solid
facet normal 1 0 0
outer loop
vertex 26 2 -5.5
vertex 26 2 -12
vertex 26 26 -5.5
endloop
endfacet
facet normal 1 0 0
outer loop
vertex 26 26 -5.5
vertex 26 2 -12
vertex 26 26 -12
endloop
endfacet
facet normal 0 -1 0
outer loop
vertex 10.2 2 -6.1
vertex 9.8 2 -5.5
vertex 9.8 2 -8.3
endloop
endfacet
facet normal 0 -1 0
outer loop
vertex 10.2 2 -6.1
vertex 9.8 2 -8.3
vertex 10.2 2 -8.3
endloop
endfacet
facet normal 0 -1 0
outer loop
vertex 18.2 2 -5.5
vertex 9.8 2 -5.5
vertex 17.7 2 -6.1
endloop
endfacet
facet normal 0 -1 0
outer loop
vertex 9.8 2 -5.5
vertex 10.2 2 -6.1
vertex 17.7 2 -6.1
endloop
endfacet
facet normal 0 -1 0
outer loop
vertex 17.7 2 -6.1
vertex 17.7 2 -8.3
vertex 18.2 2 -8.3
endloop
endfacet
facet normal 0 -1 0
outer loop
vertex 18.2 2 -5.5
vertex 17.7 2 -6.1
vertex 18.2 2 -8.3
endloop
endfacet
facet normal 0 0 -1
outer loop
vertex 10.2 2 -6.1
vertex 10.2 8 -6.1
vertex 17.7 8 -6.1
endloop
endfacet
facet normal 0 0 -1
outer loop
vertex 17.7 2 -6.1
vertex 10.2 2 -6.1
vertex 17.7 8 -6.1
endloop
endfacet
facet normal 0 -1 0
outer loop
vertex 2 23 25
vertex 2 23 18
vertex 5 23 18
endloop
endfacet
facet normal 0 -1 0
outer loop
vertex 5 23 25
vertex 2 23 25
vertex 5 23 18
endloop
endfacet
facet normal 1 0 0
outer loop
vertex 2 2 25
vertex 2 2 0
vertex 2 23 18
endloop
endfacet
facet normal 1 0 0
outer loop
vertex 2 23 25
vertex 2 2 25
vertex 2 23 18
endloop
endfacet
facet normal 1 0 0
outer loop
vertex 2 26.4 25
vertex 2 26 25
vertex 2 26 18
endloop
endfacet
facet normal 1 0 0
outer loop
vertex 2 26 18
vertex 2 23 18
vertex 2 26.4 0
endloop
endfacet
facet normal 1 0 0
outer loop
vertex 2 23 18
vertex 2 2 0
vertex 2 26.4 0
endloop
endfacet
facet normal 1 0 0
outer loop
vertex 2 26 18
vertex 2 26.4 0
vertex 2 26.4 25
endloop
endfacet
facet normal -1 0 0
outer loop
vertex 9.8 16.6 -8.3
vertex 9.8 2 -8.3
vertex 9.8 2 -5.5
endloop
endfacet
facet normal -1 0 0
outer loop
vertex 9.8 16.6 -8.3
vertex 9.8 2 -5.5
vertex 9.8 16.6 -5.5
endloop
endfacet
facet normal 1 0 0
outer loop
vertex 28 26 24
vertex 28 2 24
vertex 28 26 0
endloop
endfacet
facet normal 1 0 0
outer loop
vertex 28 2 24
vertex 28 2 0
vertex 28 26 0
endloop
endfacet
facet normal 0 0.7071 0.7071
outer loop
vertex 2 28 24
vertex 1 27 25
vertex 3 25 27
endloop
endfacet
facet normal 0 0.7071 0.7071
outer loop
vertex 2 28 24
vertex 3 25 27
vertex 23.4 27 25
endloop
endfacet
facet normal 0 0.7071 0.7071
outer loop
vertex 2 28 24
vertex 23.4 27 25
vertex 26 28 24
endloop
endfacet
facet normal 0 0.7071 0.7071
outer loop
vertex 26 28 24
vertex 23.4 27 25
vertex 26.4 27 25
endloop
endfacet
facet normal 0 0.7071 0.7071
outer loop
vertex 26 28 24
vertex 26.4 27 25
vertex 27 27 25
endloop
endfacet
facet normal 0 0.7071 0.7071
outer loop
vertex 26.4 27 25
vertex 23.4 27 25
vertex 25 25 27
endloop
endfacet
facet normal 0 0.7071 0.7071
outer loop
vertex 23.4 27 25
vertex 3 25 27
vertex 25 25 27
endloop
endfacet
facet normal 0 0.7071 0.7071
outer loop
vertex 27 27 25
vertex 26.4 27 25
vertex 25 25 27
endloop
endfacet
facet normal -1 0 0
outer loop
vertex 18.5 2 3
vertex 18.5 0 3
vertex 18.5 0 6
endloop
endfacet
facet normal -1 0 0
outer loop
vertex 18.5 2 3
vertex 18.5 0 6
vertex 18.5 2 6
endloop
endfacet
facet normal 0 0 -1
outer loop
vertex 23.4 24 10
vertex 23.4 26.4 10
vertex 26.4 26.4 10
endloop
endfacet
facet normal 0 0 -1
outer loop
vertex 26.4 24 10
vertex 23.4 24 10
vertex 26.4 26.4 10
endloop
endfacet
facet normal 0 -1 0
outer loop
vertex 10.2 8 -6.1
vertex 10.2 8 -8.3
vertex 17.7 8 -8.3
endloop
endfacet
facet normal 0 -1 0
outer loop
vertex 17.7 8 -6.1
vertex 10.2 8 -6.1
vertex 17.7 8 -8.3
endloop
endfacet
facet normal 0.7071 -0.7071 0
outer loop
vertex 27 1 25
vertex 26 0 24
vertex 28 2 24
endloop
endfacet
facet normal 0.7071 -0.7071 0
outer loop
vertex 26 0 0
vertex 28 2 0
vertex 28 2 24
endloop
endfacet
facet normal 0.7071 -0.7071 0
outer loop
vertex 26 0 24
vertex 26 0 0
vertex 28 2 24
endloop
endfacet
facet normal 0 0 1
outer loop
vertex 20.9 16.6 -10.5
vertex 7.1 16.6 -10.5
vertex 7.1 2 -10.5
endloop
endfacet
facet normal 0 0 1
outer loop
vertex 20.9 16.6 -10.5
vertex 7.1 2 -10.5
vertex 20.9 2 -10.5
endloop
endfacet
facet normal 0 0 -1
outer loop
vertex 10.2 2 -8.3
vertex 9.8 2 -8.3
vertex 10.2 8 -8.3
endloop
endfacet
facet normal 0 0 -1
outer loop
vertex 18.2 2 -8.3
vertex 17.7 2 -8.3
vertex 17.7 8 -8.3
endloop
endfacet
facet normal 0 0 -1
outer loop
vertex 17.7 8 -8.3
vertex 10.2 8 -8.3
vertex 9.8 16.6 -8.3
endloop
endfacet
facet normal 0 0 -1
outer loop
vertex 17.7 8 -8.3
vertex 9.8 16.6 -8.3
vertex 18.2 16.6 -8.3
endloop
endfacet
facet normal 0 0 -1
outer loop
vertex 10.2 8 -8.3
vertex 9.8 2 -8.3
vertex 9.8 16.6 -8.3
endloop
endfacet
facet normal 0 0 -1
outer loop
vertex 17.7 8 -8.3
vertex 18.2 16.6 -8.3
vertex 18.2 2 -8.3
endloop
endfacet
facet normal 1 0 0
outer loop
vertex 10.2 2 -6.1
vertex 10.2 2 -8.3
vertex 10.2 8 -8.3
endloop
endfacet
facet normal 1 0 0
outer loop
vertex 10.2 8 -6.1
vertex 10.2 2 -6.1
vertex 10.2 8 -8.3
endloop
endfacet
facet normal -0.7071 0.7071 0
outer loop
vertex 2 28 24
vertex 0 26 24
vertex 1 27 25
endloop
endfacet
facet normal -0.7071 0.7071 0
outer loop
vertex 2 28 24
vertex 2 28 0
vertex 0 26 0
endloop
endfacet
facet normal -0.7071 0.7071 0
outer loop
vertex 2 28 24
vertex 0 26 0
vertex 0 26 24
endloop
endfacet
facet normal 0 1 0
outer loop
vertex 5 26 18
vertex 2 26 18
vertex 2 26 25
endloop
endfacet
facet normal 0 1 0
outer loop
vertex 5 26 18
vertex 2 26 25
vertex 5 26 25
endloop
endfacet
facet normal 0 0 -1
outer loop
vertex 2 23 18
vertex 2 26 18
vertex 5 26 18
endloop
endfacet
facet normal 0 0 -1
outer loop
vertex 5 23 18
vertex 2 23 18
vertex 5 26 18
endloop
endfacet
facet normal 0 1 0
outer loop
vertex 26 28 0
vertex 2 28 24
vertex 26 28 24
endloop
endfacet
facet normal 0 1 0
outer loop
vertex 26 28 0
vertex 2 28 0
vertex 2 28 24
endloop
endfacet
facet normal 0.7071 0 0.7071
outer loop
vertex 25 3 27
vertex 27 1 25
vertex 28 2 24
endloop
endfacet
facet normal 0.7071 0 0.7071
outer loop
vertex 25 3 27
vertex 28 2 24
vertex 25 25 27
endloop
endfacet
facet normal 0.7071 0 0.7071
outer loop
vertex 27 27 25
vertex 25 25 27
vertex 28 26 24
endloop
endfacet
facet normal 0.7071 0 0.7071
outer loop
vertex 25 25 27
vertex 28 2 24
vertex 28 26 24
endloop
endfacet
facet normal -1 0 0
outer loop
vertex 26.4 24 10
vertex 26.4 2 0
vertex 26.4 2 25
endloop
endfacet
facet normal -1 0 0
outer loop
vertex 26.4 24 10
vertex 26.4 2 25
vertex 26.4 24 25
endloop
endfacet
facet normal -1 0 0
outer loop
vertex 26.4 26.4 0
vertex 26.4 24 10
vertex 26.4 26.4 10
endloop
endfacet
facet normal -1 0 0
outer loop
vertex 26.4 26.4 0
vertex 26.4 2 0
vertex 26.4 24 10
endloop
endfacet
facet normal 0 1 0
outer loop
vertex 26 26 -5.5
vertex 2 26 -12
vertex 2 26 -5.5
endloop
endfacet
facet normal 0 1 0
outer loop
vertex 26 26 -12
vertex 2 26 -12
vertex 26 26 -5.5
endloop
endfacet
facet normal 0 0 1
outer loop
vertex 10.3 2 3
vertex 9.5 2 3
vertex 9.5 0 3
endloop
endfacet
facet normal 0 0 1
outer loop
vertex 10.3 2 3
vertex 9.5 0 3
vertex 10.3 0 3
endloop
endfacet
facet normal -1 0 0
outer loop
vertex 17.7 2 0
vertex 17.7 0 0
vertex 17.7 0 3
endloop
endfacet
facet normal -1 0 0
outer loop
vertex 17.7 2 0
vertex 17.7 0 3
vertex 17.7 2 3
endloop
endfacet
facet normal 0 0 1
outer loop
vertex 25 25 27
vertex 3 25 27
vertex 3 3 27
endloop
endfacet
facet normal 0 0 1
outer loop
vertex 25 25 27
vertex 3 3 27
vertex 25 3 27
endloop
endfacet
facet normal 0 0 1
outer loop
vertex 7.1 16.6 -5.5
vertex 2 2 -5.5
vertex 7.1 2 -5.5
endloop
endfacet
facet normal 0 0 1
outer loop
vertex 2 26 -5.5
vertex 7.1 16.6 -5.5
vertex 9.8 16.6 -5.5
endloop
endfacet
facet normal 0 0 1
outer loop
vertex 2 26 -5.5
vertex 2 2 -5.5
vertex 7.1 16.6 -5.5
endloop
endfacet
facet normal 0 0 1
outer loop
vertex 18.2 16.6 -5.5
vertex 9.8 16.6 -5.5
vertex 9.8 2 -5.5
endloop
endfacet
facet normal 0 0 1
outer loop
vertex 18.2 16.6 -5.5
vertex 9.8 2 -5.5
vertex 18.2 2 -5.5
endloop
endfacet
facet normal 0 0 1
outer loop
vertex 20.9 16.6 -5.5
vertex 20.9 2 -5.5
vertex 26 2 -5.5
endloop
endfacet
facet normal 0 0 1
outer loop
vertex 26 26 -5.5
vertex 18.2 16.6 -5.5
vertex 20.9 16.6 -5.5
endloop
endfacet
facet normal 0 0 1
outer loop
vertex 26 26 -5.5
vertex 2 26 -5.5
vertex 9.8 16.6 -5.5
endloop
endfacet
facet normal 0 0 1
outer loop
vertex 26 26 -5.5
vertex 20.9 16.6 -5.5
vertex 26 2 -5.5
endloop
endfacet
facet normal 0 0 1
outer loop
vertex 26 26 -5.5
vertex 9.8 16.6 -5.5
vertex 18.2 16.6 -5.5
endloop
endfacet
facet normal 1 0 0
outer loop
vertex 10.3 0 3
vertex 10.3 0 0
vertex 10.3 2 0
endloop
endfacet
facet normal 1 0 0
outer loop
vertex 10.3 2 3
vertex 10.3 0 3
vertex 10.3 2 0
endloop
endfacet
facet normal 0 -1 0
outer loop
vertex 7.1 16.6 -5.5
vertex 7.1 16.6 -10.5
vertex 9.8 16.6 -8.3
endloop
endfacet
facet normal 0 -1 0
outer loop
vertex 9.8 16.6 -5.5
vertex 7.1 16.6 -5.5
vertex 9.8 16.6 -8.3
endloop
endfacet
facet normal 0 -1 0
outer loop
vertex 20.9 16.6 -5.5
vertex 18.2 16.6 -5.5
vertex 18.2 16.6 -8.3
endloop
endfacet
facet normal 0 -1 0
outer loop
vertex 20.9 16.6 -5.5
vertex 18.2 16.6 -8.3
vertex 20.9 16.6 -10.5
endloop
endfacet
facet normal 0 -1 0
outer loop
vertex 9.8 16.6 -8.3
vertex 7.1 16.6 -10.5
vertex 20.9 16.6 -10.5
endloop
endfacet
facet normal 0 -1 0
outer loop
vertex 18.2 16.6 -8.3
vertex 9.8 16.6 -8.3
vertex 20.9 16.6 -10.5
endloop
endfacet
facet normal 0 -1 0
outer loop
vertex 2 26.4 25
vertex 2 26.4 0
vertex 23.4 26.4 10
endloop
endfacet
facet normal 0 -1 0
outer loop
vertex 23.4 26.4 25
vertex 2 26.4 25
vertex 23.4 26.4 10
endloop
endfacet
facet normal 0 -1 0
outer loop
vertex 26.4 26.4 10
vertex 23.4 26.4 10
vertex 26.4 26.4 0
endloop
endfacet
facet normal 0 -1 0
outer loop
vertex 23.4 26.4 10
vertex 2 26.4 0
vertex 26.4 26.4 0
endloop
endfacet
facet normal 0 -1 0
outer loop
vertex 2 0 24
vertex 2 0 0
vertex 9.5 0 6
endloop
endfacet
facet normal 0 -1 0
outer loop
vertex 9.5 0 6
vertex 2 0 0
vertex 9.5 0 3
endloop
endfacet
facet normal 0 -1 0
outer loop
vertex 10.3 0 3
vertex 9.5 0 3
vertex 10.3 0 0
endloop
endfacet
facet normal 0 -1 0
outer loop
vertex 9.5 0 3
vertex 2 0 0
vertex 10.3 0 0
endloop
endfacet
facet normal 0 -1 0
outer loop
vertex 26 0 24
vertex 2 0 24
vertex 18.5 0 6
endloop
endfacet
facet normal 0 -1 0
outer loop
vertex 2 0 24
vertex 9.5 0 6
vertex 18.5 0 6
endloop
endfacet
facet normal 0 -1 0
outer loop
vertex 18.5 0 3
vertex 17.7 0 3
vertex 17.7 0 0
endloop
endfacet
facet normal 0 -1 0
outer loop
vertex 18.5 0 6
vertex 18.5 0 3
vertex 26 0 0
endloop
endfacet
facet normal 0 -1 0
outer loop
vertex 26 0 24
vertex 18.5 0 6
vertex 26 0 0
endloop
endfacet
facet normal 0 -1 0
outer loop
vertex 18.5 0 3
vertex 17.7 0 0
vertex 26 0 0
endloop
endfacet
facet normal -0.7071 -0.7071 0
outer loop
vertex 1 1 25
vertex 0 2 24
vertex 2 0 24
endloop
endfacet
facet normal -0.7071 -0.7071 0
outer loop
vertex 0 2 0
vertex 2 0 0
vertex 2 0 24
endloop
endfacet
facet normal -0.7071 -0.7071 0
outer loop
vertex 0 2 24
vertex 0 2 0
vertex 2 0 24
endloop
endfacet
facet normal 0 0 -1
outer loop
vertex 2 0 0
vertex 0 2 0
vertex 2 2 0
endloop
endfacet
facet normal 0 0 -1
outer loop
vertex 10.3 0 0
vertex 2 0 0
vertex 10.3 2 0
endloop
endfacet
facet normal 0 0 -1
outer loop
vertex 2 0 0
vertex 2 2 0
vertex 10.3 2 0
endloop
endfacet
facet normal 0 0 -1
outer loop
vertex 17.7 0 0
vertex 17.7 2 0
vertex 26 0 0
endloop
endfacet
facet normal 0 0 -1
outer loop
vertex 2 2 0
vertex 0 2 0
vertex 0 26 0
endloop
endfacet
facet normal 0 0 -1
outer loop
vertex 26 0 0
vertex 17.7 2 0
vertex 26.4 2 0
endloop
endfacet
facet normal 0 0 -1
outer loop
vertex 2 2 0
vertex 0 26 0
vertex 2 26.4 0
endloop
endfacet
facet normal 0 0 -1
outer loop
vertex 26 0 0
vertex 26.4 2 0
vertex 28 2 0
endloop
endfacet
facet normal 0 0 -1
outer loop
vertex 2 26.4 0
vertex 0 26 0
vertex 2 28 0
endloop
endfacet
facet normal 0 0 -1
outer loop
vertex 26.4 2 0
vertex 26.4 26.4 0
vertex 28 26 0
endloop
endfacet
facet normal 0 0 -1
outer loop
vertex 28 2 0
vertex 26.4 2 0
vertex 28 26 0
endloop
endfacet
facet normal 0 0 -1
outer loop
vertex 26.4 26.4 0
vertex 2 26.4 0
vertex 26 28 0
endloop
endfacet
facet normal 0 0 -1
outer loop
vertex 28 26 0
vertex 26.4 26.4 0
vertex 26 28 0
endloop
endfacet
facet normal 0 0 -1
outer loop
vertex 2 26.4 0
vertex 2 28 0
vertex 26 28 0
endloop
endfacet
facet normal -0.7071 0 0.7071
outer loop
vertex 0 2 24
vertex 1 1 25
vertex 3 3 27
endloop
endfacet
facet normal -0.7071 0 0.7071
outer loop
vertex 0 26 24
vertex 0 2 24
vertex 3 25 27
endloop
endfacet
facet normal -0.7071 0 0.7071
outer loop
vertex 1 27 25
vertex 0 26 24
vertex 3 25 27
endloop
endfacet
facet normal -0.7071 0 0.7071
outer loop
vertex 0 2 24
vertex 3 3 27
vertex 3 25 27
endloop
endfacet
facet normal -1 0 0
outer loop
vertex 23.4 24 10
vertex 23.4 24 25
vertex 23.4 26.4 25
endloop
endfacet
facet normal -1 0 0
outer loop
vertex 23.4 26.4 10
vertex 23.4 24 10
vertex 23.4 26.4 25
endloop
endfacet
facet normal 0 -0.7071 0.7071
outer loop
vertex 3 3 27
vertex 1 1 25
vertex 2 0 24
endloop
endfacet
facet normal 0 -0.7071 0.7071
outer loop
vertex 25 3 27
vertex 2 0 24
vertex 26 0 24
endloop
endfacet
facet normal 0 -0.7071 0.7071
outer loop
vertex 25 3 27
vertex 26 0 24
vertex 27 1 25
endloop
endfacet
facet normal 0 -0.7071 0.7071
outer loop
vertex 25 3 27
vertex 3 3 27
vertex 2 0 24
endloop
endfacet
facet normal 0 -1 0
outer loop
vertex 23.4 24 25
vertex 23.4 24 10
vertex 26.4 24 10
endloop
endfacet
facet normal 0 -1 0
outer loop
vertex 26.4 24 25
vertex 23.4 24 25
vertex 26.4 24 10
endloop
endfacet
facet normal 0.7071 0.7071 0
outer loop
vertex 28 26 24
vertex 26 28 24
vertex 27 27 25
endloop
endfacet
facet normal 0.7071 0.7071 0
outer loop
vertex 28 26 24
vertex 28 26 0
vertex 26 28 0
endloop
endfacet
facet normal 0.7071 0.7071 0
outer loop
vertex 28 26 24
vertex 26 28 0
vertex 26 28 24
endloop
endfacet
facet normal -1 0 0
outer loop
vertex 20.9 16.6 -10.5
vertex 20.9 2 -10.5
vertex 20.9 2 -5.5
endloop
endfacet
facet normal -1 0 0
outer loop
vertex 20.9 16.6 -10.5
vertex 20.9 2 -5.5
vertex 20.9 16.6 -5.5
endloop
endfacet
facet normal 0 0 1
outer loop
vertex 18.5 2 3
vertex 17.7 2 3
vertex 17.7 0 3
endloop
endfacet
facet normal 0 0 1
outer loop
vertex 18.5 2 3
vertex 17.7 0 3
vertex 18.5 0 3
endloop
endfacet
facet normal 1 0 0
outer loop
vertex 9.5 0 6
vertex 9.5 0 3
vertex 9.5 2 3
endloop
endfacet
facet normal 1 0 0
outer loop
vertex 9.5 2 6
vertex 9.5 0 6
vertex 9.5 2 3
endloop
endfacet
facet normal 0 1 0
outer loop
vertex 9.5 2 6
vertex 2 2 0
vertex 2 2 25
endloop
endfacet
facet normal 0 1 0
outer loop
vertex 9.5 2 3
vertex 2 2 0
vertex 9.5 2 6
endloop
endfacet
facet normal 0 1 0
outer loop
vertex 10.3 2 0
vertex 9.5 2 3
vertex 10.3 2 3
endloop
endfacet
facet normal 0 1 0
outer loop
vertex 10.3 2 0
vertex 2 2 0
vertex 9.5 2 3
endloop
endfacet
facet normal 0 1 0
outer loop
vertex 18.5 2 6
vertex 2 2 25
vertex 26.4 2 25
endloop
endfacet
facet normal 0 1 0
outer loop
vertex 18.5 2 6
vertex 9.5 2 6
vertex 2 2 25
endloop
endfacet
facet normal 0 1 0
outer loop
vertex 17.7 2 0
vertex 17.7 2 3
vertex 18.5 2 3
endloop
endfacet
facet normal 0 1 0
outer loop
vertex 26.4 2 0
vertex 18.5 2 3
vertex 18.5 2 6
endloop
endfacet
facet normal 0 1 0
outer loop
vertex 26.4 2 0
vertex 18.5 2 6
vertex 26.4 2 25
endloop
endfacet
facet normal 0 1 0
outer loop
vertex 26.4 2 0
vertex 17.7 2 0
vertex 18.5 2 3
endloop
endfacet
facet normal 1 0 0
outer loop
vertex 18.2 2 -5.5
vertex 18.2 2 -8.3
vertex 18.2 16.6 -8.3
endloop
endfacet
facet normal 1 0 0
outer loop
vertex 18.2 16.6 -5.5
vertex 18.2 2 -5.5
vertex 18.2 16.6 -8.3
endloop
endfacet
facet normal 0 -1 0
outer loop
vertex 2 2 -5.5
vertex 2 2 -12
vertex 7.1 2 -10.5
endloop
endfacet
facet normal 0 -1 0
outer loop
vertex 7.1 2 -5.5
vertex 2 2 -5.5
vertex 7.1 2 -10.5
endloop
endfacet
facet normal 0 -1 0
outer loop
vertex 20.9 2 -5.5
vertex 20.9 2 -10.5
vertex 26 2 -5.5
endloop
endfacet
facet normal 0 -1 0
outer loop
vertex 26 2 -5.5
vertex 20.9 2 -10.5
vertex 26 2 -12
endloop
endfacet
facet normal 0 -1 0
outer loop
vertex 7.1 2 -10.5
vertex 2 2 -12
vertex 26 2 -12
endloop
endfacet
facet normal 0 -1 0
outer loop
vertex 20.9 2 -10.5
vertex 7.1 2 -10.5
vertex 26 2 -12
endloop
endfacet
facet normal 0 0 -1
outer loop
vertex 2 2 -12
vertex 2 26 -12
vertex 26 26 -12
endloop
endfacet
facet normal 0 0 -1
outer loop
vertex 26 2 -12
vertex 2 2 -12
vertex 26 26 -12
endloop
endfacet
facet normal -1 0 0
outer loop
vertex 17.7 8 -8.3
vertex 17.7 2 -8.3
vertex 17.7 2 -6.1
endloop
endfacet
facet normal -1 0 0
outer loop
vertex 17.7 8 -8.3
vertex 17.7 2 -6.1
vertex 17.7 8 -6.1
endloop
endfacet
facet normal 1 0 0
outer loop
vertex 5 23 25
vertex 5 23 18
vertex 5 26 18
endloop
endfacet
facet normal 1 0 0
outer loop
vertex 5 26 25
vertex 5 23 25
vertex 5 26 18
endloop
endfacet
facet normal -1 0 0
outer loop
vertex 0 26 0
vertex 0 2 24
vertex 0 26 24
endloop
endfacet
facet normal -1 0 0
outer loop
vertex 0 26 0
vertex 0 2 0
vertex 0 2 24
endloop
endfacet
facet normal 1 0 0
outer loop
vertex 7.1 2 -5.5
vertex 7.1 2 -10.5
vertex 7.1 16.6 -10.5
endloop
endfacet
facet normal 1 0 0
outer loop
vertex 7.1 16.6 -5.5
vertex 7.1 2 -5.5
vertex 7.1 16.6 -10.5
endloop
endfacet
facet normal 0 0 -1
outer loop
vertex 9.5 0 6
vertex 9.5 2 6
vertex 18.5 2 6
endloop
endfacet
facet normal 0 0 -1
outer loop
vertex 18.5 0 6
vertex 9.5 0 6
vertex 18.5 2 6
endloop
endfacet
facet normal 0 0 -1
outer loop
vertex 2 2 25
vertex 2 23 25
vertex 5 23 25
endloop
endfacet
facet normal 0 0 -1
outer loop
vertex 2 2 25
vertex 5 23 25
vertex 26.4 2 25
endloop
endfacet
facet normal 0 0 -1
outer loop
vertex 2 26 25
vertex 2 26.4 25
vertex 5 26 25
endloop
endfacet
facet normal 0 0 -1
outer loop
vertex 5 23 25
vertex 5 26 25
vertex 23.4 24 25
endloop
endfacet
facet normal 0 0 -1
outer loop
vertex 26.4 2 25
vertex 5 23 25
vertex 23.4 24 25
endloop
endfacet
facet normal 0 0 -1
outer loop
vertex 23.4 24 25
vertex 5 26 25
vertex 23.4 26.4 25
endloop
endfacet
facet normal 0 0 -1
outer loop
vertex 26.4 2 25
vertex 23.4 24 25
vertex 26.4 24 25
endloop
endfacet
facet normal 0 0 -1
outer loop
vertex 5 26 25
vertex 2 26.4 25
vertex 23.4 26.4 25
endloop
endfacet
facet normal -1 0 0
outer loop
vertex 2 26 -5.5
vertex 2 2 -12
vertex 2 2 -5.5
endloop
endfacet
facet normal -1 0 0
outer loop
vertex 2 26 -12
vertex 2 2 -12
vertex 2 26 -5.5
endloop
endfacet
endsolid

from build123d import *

# Parameters (mm, degrees)
BOX_W           = 28
BOX_H           = 28
BOX_DEPTH       = 27
BOX001_W        = 24.4
BOX001_H        = 24.4
BOX001_DEPTH    = 25
BOX004_W        = 7.4
BOX004_H        = 2.3
BOX004_DEPTH    = 5
CHAMFER_SIZE    = 3
CHAMFER001_SIZE = 2
BOX007_W        = 3
BOX007_H        = 3
BOX007_DEPTH    = 15
BOX008_W        = 3
BOX008_H        = 3
BOX008_DEPTH    = 7
BOX009_W        = 9
BOX009_H        = 2
BOX009_DEPTH    = 3
BOX002_W        = 24
BOX002_H        = 24
BOX002_DEPTH    = 6.5
BOX003_W        = 13.8
BOX003_H        = 14.6
BOX003_DEPTH    = 5
BOX005_W        = 8.4
BOX005_H        = 15.5
BOX005_DEPTH    = 2.8
BOX006_W        = 7.5
BOX006_H        = 6
BOX006_DEPTH    = 2.4


with BuildPart() as body:
    # Box → Box (join)
    with BuildSketch(Plane.XY):
        with Locations((14, 14)):
            Rectangle(BOX_W, BOX_H)
    extrude(amount=BOX_DEPTH)

    # Box001 → Box001 (cut)
    with BuildSketch(Plane(origin=(2, 2, 0), x_dir=(1, 0, 0), z_dir=(0, 0, 1))):
        with Locations((12.2, 12.2)):
            Rectangle(BOX001_W, BOX001_H)
    extrude(amount=BOX001_DEPTH, mode=Mode.SUBTRACT)

    # Box004 → Box004 (cut)
    with BuildSketch(Plane(origin=(10.3, 0, 0), x_dir=(1, 0, 0), z_dir=(0, 0, 1))):
        with Locations((3.7, 1.15)):
            Rectangle(BOX004_W, BOX004_H)
    extrude(amount=BOX004_DEPTH, mode=Mode.SUBTRACT)

    # Chamfer
    chamfer_edges = [body.edges().sort_by_distance(p)[0] for p in [
        (0, 14, 27),
        (14, 0, 27),
        (28, 14, 27),
        (14, 28, 27),
    ]]
    chamfer(chamfer_edges, length=CHAMFER_SIZE)

    # Chamfer001
    chamfer001_edges = [body.edges().sort_by_distance(p)[0] for p in [
        (0, 0, 12),
        (0, 28, 12),
        (28, 0, 12),
        (28, 28, 12),
    ]]
    chamfer(chamfer001_edges, length=CHAMFER001_SIZE)

    # Box007 → Box007 (join)
    with BuildSketch(Plane(origin=(23.4, 24, 10), x_dir=(1, 0, 0), z_dir=(0, 0, 1))):
        with Locations((1.5, 1.5)):
            Rectangle(BOX007_W, BOX007_H)
    extrude(amount=BOX007_DEPTH)

    # Box008 → Box008 (join)
    with BuildSketch(Plane(origin=(2, 23, 18), x_dir=(1, 0, 0), z_dir=(0, 0, 1))):
        with Locations((1.5, 1.5)):
            Rectangle(BOX008_W, BOX008_H)
    extrude(amount=BOX008_DEPTH)

    # Box009 → Box009 (cut)
    with BuildSketch(Plane(origin=(9.5, 0, 3), x_dir=(1, 0, 0), z_dir=(0, 0, 1))):
        with Locations((4.5, 1)):
            Rectangle(BOX009_W, BOX009_H)
    extrude(amount=BOX009_DEPTH, mode=Mode.SUBTRACT)


with BuildPart() as body001:
    # Box002 → Box002 (join)
    with BuildSketch(Plane(origin=(2, 2, -12), x_dir=(1, 0, 0), z_dir=(0, 0, 1))):
        with Locations((12, 12)):
            Rectangle(BOX002_W, BOX002_H)
    extrude(amount=BOX002_DEPTH)

    # Box003 → Box003 (cut)
    with BuildSketch(Plane(origin=(7.1, 2, -10.5), x_dir=(1, 0, 0), z_dir=(0, 0, 1))):
        with Locations((6.9, 7.3)):
            Rectangle(BOX003_W, BOX003_H)
    extrude(amount=BOX003_DEPTH, mode=Mode.SUBTRACT)

    # Box005 → Box005 (join)
    with BuildSketch(Plane(origin=(9.8, 2, -8.3), x_dir=(1, 0, 0), z_dir=(0, 0, 1))):
        with Locations((4.2, 7.75)):
            Rectangle(BOX005_W, BOX005_H)
    extrude(amount=BOX005_DEPTH)

    # Box006 → Box006 (cut)
    with BuildSketch(Plane(origin=(10.2, 2, -8.5), x_dir=(1, 0, 0), z_dir=(0, 0, 1))):
        with Locations((3.75, 3)):
            Rectangle(BOX006_W, BOX006_H)
    extrude(amount=BOX006_DEPTH, mode=Mode.SUBTRACT)


solid = Compound([body.part, body001.part])
